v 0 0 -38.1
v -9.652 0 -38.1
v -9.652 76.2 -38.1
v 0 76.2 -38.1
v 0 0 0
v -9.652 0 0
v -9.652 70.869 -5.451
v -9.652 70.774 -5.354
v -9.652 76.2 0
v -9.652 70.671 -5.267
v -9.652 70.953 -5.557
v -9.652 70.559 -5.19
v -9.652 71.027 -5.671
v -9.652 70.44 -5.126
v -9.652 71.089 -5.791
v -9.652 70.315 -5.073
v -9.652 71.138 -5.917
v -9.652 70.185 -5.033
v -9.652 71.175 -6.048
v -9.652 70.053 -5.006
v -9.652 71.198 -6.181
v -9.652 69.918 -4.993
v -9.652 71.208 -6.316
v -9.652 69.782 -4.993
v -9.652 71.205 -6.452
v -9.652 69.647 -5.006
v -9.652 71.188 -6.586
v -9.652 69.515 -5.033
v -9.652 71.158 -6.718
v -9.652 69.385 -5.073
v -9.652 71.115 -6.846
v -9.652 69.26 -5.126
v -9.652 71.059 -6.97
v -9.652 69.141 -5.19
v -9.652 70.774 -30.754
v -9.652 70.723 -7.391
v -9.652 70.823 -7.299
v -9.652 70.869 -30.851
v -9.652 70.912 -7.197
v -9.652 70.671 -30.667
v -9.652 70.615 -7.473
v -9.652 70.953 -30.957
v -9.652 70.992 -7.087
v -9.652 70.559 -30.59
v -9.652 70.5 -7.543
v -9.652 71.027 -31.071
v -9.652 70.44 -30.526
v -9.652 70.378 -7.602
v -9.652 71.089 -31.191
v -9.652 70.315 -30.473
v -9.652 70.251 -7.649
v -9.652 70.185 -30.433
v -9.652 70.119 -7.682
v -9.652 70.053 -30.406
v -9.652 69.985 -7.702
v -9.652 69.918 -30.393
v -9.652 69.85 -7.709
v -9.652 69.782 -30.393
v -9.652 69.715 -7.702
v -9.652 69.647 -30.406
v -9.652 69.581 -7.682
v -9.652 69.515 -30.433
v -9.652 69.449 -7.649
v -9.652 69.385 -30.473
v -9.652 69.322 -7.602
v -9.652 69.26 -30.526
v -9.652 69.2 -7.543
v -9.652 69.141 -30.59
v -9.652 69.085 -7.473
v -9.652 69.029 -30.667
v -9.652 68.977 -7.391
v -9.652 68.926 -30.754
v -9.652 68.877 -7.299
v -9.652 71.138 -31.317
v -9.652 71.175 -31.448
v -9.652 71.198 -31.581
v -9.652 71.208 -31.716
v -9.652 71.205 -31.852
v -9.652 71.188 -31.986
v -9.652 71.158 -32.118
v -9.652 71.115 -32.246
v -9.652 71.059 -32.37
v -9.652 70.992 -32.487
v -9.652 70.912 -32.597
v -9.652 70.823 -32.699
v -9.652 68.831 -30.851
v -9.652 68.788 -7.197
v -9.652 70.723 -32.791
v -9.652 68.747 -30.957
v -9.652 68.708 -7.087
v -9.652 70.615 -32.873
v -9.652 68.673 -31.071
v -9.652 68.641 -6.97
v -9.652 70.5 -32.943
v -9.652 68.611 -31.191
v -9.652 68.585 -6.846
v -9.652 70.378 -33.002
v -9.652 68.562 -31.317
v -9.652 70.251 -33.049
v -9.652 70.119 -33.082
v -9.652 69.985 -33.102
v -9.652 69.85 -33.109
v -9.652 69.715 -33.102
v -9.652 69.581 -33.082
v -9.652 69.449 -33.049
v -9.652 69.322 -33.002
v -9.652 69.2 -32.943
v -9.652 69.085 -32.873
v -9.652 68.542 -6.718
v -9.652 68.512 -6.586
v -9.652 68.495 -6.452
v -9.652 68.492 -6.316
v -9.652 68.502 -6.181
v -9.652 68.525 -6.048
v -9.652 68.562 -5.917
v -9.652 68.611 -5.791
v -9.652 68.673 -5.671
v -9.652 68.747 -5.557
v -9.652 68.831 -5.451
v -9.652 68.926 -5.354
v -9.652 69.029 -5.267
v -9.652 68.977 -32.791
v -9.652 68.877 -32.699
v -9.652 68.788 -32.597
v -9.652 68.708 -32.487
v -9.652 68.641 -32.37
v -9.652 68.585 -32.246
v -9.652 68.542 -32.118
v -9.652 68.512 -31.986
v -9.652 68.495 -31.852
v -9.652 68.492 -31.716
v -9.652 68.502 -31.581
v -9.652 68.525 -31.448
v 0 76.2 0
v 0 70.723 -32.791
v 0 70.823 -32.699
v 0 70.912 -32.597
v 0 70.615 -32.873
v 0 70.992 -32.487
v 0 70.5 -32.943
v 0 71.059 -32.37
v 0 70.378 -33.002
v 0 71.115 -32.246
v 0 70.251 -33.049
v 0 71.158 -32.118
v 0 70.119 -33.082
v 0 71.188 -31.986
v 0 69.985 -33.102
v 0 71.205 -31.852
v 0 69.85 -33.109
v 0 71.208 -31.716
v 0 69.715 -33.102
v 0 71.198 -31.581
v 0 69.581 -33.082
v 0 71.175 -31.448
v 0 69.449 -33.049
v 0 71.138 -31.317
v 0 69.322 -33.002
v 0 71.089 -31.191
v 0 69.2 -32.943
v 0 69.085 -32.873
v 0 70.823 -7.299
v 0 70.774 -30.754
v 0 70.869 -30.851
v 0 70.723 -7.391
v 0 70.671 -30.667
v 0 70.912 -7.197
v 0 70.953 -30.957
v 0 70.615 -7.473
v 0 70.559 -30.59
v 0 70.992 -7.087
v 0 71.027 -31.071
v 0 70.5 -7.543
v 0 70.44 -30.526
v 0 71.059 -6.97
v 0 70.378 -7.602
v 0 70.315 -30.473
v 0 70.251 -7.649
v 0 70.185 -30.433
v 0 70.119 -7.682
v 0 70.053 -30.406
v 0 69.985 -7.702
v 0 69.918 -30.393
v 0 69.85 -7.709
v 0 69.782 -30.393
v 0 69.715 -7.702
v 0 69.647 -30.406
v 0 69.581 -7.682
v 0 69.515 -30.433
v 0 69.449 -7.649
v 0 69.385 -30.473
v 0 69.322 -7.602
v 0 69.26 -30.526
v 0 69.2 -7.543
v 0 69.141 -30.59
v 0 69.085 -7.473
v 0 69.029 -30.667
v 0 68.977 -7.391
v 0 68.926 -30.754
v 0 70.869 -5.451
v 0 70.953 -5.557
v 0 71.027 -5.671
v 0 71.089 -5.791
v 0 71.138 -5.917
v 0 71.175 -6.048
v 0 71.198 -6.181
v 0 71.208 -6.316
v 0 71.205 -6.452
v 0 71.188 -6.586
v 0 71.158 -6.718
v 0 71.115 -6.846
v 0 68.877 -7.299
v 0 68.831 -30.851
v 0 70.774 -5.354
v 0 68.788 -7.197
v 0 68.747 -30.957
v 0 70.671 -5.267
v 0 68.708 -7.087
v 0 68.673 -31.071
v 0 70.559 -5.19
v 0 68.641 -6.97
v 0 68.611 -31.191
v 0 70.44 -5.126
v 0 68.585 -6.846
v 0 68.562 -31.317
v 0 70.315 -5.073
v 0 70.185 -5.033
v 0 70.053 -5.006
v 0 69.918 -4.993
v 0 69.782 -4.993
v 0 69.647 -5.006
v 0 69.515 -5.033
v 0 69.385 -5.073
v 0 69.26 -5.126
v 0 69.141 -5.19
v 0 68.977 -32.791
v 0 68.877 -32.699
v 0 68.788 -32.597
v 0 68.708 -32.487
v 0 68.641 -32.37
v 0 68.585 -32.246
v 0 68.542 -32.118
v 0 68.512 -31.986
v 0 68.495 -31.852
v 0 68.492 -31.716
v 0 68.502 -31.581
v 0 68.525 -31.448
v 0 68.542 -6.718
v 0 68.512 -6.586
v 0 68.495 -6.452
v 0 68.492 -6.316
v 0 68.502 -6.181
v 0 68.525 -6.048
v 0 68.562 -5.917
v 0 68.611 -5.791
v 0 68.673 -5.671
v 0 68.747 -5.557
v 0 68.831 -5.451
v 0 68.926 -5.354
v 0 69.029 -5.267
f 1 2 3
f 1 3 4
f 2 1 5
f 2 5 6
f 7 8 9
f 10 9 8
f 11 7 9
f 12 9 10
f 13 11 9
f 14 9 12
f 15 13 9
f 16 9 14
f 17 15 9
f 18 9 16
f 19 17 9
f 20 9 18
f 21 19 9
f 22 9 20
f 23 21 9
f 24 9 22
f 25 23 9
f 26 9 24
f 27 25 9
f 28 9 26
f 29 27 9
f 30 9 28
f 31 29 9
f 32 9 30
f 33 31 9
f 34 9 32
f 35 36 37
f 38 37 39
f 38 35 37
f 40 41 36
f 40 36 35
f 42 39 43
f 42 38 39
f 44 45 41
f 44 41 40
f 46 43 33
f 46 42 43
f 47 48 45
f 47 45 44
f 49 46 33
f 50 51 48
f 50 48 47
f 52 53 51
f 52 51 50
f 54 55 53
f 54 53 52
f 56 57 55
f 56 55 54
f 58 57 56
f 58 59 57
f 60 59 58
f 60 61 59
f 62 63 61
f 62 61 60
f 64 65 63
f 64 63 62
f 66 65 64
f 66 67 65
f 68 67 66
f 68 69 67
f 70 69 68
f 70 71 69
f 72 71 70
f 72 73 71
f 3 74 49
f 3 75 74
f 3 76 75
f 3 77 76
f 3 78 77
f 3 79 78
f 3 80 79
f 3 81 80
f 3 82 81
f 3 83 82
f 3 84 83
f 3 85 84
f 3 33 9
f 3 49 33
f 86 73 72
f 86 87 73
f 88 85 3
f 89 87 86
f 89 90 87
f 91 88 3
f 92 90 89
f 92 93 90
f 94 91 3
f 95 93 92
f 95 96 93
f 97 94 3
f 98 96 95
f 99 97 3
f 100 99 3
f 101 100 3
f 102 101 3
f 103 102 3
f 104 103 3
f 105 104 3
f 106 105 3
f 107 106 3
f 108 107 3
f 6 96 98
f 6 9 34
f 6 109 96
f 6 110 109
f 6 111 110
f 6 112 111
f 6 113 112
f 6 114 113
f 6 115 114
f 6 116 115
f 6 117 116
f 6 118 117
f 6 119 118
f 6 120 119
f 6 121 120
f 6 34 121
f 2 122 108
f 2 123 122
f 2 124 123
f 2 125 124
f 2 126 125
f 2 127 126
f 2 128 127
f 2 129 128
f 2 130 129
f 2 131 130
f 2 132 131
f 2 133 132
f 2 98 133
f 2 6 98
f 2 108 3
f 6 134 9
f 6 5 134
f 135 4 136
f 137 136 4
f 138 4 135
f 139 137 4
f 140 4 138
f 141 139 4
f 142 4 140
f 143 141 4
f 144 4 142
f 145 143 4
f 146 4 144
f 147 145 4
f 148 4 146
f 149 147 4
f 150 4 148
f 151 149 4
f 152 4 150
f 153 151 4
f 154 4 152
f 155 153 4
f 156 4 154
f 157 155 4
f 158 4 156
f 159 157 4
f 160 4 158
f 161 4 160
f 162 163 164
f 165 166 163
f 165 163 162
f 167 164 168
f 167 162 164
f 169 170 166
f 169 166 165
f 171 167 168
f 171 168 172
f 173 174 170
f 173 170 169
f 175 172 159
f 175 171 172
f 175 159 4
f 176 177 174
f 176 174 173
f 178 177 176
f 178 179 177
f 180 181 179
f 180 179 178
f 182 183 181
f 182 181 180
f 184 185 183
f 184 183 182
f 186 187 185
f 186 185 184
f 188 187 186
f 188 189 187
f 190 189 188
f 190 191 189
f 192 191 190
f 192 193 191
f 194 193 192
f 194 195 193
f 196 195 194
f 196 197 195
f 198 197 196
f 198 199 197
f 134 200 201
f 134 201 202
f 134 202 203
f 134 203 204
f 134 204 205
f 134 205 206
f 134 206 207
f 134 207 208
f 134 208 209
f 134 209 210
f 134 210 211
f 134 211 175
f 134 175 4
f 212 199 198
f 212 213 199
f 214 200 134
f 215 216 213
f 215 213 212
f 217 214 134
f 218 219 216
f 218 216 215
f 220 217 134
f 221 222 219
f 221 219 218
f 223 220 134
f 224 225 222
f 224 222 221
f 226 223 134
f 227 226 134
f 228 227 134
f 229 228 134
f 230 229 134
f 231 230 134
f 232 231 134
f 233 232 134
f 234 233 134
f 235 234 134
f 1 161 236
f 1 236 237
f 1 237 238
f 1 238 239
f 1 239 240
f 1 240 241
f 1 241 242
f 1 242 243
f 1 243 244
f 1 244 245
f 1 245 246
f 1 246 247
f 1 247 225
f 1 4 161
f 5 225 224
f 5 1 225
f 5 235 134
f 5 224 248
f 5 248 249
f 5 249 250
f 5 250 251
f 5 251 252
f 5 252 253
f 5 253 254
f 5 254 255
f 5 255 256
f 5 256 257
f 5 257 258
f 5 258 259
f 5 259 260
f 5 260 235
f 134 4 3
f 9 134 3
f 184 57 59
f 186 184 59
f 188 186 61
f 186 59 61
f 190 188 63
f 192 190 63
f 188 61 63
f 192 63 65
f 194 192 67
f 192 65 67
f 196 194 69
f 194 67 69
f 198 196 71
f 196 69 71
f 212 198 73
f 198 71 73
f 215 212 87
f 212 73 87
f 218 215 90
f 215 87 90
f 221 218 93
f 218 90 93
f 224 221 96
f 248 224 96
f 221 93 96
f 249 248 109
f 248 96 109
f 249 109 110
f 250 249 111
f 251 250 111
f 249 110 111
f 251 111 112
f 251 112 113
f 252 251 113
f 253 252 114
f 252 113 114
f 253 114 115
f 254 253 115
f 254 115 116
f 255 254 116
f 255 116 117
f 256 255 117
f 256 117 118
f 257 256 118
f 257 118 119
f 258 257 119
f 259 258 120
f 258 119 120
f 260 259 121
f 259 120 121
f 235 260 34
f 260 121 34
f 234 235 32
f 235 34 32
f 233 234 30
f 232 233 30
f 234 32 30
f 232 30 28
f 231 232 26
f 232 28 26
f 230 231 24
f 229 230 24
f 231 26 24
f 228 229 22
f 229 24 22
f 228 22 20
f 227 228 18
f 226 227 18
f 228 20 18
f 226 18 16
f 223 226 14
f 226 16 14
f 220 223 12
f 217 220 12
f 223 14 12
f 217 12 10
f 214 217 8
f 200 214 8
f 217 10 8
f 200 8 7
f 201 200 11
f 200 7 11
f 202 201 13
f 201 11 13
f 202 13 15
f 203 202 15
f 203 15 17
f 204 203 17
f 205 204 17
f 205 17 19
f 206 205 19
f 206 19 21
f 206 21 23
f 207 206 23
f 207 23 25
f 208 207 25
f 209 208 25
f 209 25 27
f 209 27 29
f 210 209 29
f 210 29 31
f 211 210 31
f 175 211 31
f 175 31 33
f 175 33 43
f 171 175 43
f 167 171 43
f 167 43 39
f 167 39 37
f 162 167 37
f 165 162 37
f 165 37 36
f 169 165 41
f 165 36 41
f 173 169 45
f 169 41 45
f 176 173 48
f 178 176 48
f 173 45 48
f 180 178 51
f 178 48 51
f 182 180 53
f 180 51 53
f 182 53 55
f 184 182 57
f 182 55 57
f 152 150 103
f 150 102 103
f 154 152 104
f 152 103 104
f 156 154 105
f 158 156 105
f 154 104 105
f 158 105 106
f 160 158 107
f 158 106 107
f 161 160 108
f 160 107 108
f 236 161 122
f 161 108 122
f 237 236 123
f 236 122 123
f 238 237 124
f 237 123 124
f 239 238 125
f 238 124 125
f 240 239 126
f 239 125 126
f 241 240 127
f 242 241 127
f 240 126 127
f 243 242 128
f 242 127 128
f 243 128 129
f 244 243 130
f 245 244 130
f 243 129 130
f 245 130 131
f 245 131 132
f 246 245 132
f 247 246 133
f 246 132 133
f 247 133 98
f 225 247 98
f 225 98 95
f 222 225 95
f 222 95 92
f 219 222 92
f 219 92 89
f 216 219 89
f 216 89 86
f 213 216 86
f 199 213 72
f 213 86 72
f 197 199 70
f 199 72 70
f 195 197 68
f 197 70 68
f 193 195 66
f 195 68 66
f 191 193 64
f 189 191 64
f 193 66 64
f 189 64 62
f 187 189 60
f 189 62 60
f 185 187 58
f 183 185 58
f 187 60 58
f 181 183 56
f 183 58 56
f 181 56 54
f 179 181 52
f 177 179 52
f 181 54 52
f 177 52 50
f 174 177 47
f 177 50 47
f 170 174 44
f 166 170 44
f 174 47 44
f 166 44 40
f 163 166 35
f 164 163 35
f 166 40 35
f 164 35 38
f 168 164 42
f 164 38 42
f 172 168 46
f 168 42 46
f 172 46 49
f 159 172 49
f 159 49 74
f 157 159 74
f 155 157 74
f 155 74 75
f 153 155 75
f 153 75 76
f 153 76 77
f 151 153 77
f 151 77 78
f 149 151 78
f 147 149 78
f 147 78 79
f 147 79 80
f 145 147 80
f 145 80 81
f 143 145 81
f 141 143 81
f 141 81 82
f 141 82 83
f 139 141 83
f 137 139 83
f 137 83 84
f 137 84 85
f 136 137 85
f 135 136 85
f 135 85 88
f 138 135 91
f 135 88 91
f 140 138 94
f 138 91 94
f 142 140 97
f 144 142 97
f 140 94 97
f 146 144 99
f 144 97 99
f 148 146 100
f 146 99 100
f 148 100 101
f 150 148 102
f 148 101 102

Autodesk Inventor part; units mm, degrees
ref_plane "YZ Plane" through (0, 0, 0) normal (1, 0, 0) x (0, 1, 0)
ref_plane "XZ Plane" through (0, 0, 0) normal (0, 1, 0) x (-1, 0, 0)
ref_plane "XY Plane" through (0, 0, 0) normal (0, 0, 1) x (1, 0, 0)
sketch "Sketch1" plane through (0, 0, 0) normal (0, 1, 0) x (-1, 0, 0)
  line L0 (0, 0) -> (9.652, 0)
  line L1 (9.652, 0) -> (9.652, -38.1)
  line L2 (9.652, -38.1) -> (0, -38.1)
  line L3 (0, -38.1) -> (0, 0)
  dimension "d0" = 9.652
  dimension "d1" = 38.1
extrude "Extrusion1" add sketch "Sketch1" along normal blind 76.2
sketch "Sketch2" plane through (0, 0, 0) normal (1, 0, 0) x (0, 0, -1)
  line L0 (38.1, 0) -> (38.1, 76.2) projected
  line L1 (0, 76.2) -> (38.1, 76.2) projected
  line L2 (0, 0) -> (0, 76.2) projected
  point P0 (6.35, 69.85)
  point P1 (31.75, 69.85)
  dimension "d4" = 6.35
  dimension "d5" = 6.35
  dimension "d6" = 6.35
  dimension "d7" = 6.35
hole "Hole1" at (0, 69.85, -6.35) at (0, 69.85, -31.75) direction (-1, 0, 0) diameter 2.7178 depth 25.4 tip angle 118
equation "\"d5\" = d4"
equation "\"d6\" = d4"
equation "\"d7\" = d4"
properties part number "motor stand"
